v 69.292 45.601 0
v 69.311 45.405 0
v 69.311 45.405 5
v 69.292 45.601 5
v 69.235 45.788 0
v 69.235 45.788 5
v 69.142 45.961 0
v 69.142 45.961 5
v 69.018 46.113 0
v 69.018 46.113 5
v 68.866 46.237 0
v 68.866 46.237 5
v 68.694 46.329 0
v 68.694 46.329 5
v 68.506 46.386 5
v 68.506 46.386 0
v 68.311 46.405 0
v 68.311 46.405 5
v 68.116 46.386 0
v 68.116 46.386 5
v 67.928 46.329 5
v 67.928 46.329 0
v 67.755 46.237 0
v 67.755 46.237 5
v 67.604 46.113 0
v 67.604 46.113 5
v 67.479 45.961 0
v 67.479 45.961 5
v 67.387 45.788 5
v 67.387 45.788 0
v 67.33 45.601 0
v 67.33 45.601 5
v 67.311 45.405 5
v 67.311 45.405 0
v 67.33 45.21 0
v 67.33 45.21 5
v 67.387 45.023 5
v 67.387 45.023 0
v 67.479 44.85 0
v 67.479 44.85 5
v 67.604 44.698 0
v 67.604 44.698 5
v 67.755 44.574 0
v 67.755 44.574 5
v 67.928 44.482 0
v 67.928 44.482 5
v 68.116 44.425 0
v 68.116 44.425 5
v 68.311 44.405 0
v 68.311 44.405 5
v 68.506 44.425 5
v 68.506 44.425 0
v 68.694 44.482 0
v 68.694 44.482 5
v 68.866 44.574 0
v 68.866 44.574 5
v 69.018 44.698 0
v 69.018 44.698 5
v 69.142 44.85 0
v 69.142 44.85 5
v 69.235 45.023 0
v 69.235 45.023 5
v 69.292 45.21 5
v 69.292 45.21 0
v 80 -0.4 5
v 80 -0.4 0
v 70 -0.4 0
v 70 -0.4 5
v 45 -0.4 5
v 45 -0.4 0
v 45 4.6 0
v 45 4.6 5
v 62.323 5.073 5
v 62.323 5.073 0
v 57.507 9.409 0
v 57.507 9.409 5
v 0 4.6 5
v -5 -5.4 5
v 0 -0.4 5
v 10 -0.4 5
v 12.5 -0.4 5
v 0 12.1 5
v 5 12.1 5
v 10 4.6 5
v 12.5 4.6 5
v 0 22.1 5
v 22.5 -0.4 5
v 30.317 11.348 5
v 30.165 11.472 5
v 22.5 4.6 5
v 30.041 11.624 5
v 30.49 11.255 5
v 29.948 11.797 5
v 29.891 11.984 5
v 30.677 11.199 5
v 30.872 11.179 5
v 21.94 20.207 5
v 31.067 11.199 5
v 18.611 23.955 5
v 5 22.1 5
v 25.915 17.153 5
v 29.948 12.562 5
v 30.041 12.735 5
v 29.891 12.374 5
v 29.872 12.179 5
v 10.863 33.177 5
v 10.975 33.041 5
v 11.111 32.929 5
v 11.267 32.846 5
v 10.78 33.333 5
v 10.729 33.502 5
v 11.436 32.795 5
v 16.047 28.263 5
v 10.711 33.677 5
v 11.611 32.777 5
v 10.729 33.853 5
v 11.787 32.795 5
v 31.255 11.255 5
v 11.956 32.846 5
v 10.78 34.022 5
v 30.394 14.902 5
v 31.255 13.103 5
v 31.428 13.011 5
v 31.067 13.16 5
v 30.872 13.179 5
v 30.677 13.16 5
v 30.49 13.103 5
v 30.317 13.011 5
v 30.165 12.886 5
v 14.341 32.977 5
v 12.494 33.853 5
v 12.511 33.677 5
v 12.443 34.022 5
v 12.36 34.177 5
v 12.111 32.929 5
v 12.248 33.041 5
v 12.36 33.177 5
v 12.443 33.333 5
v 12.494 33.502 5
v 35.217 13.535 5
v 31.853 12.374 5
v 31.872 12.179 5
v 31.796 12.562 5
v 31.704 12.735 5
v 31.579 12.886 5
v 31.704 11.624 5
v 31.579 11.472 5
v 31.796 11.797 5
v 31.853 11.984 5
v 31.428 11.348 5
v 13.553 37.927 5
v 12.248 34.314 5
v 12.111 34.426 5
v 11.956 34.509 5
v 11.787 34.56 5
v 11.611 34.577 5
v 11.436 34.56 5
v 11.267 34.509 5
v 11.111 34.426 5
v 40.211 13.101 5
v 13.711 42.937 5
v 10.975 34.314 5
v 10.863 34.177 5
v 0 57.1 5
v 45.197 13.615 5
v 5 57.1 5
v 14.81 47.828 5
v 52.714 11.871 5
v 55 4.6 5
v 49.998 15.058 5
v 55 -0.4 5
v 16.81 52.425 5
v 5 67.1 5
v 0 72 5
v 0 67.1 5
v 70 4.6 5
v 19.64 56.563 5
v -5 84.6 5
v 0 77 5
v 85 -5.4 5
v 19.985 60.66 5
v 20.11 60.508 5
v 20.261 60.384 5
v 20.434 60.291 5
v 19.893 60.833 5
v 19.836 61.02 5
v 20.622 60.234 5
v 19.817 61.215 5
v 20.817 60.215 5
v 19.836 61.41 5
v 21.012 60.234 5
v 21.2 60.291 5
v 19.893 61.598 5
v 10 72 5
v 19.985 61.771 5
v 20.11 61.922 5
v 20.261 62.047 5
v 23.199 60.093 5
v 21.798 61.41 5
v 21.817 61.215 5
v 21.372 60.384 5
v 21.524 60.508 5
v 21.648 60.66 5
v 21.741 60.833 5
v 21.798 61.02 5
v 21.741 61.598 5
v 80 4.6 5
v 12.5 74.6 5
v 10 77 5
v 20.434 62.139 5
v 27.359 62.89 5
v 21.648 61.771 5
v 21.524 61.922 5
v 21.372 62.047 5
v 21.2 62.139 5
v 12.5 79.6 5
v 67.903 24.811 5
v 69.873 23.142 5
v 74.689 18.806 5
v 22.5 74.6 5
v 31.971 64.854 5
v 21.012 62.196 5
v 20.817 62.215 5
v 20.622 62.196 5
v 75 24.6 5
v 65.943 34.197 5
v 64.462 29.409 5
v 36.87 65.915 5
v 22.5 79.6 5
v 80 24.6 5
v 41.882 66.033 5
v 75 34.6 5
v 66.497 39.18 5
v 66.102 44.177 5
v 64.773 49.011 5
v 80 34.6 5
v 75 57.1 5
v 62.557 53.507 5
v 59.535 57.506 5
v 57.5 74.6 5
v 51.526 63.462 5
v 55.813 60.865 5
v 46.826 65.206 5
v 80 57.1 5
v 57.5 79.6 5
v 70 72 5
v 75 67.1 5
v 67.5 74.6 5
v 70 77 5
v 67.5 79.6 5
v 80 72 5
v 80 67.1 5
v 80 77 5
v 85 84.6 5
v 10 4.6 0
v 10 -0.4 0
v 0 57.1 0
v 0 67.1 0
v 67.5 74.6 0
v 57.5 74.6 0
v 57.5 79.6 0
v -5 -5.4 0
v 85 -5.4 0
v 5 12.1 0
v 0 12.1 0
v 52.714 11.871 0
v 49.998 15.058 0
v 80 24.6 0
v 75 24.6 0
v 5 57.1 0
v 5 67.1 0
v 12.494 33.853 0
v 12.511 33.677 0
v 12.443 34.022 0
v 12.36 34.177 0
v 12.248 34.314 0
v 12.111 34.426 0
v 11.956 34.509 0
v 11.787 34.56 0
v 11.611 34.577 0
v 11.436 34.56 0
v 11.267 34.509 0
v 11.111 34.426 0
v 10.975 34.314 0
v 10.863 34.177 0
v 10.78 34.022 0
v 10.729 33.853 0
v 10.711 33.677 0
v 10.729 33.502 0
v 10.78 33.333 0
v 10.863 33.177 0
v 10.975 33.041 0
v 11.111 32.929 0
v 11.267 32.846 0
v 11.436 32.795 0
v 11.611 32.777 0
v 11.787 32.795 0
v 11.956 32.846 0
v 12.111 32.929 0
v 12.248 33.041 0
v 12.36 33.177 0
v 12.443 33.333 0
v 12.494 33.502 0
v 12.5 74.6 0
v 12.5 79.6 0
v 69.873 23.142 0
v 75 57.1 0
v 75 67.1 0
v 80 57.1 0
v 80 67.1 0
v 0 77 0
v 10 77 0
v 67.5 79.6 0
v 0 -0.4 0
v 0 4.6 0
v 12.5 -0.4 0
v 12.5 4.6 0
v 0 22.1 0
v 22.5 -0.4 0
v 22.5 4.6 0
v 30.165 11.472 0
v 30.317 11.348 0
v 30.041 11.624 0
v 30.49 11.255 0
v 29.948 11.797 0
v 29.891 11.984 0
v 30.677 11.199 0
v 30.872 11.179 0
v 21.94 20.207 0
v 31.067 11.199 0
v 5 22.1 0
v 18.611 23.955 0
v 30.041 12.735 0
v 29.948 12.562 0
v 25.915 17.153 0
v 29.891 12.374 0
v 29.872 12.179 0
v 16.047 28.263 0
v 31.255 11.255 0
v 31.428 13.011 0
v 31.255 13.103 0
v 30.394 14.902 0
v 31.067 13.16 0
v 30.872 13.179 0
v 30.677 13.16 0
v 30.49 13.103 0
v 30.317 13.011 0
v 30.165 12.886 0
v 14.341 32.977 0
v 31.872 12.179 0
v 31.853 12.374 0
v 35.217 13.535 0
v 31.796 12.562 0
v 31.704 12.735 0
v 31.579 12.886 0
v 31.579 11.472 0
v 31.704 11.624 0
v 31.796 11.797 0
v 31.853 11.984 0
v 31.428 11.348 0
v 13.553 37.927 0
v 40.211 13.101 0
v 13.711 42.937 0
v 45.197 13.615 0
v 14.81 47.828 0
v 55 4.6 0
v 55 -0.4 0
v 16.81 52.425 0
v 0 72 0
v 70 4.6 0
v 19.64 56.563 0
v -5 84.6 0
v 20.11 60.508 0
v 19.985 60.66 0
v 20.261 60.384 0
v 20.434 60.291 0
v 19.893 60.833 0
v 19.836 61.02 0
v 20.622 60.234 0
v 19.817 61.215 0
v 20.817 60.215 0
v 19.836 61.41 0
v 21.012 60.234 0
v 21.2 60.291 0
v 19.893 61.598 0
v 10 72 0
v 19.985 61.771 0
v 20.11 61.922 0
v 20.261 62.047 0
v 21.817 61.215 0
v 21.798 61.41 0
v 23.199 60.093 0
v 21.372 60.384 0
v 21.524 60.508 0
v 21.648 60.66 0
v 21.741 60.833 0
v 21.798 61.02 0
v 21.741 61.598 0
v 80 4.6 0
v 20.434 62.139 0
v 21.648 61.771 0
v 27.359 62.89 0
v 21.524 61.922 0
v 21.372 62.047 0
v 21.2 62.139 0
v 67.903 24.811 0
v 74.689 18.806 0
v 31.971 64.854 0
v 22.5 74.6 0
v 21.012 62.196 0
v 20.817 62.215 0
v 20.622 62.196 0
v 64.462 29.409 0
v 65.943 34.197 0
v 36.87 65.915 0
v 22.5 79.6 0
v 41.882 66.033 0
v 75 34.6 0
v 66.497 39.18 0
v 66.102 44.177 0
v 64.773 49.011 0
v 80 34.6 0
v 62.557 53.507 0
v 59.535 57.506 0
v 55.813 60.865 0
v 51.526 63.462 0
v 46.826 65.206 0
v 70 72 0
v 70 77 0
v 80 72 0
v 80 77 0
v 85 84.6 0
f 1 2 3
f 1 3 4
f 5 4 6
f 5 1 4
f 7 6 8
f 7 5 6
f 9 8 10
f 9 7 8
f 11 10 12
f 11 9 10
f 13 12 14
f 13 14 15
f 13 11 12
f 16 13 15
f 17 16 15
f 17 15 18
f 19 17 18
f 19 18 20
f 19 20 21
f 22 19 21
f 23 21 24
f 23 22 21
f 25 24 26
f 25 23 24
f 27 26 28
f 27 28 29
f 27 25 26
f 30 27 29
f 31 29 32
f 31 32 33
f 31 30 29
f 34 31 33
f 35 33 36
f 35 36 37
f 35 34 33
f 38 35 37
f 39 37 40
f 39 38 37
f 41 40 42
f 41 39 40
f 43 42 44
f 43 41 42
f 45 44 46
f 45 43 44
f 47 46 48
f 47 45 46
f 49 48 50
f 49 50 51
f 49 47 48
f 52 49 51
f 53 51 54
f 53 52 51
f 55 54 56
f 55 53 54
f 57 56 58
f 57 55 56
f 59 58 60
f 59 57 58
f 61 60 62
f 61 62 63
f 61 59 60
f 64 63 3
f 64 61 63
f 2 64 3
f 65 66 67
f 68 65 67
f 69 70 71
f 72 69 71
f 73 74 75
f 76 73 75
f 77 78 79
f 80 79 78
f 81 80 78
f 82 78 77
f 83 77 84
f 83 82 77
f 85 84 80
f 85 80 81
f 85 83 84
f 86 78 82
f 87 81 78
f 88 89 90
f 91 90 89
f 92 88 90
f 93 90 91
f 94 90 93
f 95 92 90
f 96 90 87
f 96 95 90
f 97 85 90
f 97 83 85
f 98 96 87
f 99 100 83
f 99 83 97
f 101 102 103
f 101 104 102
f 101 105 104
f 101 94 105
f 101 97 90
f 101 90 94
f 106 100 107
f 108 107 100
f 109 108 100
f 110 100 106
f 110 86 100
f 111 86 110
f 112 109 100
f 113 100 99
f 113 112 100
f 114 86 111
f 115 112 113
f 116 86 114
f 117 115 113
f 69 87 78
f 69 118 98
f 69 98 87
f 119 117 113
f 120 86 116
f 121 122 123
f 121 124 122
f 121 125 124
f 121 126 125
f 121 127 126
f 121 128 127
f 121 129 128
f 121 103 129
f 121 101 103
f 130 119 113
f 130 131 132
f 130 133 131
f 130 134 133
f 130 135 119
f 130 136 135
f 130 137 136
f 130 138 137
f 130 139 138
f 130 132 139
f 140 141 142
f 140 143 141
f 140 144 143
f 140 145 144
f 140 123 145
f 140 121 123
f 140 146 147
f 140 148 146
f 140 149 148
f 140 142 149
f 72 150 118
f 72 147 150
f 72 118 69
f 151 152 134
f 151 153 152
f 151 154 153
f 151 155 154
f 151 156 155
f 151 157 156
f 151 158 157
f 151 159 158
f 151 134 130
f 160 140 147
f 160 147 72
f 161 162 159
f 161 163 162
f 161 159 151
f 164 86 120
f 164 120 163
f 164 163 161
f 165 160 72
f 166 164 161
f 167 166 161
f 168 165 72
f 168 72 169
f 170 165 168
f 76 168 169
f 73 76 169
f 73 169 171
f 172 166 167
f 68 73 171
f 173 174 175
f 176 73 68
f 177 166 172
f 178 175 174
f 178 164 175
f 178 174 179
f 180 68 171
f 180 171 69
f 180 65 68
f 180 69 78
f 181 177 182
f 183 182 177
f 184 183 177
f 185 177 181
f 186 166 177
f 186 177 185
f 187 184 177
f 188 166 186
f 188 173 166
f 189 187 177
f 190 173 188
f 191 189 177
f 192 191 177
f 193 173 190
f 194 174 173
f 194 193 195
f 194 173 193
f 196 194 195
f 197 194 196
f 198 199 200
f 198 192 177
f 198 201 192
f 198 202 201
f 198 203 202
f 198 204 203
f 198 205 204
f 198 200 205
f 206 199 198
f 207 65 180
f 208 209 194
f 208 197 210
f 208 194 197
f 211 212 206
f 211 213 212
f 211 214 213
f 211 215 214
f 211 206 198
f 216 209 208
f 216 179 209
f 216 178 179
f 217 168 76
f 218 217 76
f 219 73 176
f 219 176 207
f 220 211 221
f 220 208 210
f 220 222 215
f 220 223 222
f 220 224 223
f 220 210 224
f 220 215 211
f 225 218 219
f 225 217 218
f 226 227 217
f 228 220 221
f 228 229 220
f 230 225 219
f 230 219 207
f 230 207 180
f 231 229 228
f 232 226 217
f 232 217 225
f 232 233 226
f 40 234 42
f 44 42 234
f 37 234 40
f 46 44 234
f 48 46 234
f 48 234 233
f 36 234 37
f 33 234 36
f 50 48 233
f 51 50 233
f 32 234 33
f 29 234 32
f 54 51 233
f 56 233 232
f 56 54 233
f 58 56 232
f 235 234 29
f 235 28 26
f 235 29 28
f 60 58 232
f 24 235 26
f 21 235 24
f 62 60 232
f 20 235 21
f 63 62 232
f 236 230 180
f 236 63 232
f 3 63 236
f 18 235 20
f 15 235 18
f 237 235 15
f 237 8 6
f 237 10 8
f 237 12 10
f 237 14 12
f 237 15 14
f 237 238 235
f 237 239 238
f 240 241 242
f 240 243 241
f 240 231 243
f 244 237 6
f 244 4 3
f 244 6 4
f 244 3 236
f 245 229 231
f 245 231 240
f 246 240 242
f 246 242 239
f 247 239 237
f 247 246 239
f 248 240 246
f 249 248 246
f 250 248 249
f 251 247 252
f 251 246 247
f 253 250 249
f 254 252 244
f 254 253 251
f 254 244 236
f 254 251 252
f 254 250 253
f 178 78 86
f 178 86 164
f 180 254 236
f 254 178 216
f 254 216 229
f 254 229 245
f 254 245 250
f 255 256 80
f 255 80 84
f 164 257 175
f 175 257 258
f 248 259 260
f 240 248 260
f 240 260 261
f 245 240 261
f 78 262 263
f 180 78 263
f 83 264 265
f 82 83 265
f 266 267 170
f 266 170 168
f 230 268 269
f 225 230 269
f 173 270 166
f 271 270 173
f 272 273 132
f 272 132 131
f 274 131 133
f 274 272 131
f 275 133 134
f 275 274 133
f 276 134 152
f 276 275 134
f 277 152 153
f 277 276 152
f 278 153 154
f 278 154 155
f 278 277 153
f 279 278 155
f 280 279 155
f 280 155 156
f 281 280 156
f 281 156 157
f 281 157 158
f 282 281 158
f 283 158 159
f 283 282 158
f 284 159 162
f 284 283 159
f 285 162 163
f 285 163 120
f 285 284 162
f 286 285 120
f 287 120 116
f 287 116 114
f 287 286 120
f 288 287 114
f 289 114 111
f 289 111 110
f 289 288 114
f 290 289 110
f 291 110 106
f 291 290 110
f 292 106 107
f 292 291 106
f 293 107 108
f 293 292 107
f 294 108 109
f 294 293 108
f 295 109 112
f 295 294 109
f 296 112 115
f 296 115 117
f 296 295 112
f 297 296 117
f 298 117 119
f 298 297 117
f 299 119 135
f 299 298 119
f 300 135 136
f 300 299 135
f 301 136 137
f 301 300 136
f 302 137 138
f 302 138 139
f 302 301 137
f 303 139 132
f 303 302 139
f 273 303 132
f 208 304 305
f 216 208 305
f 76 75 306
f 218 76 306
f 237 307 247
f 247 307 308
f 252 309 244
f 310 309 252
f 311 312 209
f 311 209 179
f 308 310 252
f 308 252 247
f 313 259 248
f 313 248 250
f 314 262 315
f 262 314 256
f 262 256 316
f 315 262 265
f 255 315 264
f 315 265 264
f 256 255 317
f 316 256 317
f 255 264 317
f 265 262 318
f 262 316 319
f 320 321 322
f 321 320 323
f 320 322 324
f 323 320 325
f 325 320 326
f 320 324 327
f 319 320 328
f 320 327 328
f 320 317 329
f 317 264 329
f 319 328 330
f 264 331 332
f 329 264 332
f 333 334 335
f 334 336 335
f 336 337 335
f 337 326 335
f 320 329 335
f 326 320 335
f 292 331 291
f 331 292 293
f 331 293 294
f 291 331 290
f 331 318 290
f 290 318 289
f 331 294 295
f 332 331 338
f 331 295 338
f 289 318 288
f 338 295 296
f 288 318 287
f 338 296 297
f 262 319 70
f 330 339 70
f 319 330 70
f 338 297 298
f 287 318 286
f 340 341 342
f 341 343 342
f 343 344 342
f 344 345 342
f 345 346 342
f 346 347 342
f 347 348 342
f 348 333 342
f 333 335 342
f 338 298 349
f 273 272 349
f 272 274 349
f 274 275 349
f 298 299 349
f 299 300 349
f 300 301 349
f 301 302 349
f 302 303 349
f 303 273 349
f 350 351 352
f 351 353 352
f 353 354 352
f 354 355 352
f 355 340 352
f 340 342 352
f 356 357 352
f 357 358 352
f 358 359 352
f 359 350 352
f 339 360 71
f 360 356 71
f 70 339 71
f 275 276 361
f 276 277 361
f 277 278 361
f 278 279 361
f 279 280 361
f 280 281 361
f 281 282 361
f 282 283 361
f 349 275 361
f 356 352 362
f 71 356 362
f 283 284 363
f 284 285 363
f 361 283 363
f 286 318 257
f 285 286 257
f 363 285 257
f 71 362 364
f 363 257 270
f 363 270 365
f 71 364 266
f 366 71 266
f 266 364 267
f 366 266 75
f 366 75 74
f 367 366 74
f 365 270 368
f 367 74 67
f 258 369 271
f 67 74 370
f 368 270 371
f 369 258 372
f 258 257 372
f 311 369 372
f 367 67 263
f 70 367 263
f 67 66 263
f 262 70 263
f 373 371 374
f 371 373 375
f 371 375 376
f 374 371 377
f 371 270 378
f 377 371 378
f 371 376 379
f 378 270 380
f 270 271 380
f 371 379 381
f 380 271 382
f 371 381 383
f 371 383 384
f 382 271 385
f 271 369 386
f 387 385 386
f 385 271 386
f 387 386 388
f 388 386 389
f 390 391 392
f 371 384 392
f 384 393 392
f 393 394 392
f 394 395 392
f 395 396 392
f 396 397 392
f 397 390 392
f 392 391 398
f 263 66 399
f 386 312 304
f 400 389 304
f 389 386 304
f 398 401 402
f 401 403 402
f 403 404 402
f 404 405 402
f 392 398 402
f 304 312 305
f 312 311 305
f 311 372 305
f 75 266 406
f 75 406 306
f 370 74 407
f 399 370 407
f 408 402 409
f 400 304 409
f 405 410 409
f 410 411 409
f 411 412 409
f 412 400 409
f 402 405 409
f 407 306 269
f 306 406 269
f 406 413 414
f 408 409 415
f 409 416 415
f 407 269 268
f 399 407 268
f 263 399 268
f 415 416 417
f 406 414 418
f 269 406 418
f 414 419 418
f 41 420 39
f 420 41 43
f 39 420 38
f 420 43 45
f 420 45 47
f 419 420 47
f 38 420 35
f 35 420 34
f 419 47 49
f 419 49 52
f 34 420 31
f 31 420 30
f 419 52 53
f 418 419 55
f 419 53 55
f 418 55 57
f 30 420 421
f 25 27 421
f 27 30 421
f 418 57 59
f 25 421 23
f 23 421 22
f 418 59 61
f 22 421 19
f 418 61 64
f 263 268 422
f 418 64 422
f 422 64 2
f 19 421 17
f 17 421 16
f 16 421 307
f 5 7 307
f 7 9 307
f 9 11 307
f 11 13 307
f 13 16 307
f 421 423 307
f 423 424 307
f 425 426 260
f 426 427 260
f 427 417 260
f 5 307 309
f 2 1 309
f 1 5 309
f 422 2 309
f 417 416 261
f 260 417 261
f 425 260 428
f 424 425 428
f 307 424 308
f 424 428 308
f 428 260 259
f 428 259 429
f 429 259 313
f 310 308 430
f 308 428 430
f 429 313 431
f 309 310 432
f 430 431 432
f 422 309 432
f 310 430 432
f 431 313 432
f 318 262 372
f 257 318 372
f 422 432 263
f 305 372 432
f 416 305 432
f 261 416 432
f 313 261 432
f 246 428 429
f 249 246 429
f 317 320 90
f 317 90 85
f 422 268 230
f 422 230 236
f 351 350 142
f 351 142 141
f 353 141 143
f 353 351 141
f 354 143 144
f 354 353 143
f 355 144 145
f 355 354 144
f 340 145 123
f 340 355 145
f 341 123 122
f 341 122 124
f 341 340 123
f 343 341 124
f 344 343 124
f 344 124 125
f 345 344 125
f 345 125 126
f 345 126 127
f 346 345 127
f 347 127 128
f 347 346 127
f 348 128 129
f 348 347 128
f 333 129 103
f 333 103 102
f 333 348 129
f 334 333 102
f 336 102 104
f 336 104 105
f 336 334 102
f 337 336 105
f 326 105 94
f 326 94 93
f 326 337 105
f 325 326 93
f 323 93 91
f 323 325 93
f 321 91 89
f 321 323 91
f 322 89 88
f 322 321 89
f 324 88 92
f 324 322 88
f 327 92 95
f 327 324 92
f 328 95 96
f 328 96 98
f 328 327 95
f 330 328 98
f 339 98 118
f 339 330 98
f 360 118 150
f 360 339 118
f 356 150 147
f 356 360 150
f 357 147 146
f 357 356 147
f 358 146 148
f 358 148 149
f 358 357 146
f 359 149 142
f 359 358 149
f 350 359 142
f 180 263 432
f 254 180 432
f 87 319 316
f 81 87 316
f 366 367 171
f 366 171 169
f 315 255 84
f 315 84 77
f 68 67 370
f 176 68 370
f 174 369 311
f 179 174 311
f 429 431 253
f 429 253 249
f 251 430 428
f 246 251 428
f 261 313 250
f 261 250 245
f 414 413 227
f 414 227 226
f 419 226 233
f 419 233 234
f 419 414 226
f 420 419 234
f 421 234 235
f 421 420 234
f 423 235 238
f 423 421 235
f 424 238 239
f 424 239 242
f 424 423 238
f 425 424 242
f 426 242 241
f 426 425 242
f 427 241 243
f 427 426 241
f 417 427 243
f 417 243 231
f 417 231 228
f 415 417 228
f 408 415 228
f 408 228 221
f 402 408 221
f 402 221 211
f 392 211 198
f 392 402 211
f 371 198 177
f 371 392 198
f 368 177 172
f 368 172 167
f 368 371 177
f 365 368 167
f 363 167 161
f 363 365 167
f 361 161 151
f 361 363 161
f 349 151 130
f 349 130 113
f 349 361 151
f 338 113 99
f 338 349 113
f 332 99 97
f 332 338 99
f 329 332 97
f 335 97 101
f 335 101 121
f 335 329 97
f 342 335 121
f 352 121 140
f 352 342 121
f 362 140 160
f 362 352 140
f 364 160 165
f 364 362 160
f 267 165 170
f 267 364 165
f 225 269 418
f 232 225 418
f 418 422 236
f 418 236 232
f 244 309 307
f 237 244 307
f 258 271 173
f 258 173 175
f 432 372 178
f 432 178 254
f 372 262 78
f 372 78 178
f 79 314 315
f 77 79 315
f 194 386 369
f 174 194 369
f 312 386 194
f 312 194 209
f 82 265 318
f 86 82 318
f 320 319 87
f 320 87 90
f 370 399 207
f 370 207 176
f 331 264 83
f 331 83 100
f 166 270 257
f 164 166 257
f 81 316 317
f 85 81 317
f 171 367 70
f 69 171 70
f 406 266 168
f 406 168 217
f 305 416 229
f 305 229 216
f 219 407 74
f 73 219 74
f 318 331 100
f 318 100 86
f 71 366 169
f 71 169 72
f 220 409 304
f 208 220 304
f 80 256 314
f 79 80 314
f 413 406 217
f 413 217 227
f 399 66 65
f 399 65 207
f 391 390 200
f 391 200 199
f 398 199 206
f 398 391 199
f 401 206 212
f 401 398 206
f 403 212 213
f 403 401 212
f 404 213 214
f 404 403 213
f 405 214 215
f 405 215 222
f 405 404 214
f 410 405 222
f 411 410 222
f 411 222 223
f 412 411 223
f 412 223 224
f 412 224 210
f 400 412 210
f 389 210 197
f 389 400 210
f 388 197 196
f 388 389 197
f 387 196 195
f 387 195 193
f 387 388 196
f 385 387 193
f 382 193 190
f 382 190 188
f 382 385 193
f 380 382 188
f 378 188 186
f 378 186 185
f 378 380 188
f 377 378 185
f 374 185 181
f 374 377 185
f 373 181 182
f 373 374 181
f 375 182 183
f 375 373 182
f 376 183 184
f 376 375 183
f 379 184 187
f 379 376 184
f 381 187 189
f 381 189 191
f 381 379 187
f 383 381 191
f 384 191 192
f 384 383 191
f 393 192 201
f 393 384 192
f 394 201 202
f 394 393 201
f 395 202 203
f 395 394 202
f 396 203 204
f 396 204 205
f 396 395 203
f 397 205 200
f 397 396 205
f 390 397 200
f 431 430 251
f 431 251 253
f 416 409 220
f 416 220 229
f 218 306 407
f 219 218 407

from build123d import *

# Parameters (mm, degrees)
ESQUISSE1_W        = 90
ESQUISSE1_H        = 90
ESQUISSE1_R        = 1
ESQUISSE1_R_2      = 0.9
BOSS_EXTRU_2_DEPTH = 5
ESQUISSE2_W        = 10
ESQUISSE2_H        = 5
ESQUISSE2_W_2      = 5
ESQUISSE2_H_2      = 10
CR_NEAUX_DEPTH     = 5


with BuildPart() as part:
    # Esquisse1 → Boss.-Extru.2 (new body)
    with BuildSketch(Plane.XY):
        with Locations((40, 39.6)):
            Rectangle(ESQUISSE1_W, ESQUISSE1_H)
        with Locations((20.816873759, 61.215218426)):
            Circle(ESQUISSE1_R, mode=Mode.SUBTRACT)
        with Locations((68.310891386, 45.405465436)):
            Circle(ESQUISSE1_R, mode=Mode.SUBTRACT)
        with Locations((30.872234855, 12.179316138)):
            Circle(ESQUISSE1_R, mode=Mode.SUBTRACT)
        with Locations((11.611234754, 33.677331021)):
            Circle(ESQUISSE1_R_2, mode=Mode.SUBTRACT)
        with BuildLine():
            Line((49.997987668, 15.058397717), (52.713992085, 11.870640851))
            Line((52.713992085, 11.870640851), (67.902534408, 24.811448374))
            Line((67.902534408, 24.811448374), (64.461892674, 29.40854246))
            ThreePointArc((64.461892674, 29.40854246), (21.335796244, 58.41216357), (49.997987668, 15.058397717))
        make_face(mode=Mode.SUBTRACT)
        Polygon((57.507314904, 9.408845516), (69.87315206, 23.142499017), (74.68907042, 18.806226648), (62.323233265, 5.072573147), align=None, mode=Mode.SUBTRACT)
    extrude(amount=BOSS_EXTRU_2_DEPTH)

    # Esquisse2 → Créneaux - (cut)
    with BuildSketch(Plane(origin=(0, 0, 0), x_dir=(-1, 0, 0), z_dir=(0, 0, -1))):
        with Locations((-75, 74.5)):
            Rectangle(ESQUISSE2_W, ESQUISSE2_H)
        with Locations((-5, 74.5)):
            Rectangle(ESQUISSE2_W, ESQUISSE2_H)
        with Locations((-17.5, 77.1)):
            Rectangle(ESQUISSE2_W, ESQUISSE2_H)
        with Locations((-75, 2.1)):
            Rectangle(ESQUISSE2_W, ESQUISSE2_H)
        with Locations((-5, 2.1)):
            Rectangle(ESQUISSE2_W, ESQUISSE2_H)
        with Locations((-62.5, 77.1)):
            Rectangle(ESQUISSE2_W, ESQUISSE2_H)
        with Locations((-2.5, 17.1)):
            Rectangle(ESQUISSE2_W_2, ESQUISSE2_H_2)
        with Locations((-2.5, 62.1)):
            Rectangle(ESQUISSE2_W_2, ESQUISSE2_H_2)
        with Locations((-17.5, 2.1)):
            Rectangle(ESQUISSE2_W, ESQUISSE2_H)
        with Locations((-50, 2.1)):
            Rectangle(ESQUISSE2_W, ESQUISSE2_H)
        with Locations((-77.5, 62.1)):
            Rectangle(ESQUISSE2_W_2, ESQUISSE2_H_2)
        with Locations((-77.5, 29.6)):
            Rectangle(ESQUISSE2_W_2, ESQUISSE2_H_2)
    extrude(amount=-CR_NEAUX_DEPTH, mode=Mode.SUBTRACT)


solid = part.part
